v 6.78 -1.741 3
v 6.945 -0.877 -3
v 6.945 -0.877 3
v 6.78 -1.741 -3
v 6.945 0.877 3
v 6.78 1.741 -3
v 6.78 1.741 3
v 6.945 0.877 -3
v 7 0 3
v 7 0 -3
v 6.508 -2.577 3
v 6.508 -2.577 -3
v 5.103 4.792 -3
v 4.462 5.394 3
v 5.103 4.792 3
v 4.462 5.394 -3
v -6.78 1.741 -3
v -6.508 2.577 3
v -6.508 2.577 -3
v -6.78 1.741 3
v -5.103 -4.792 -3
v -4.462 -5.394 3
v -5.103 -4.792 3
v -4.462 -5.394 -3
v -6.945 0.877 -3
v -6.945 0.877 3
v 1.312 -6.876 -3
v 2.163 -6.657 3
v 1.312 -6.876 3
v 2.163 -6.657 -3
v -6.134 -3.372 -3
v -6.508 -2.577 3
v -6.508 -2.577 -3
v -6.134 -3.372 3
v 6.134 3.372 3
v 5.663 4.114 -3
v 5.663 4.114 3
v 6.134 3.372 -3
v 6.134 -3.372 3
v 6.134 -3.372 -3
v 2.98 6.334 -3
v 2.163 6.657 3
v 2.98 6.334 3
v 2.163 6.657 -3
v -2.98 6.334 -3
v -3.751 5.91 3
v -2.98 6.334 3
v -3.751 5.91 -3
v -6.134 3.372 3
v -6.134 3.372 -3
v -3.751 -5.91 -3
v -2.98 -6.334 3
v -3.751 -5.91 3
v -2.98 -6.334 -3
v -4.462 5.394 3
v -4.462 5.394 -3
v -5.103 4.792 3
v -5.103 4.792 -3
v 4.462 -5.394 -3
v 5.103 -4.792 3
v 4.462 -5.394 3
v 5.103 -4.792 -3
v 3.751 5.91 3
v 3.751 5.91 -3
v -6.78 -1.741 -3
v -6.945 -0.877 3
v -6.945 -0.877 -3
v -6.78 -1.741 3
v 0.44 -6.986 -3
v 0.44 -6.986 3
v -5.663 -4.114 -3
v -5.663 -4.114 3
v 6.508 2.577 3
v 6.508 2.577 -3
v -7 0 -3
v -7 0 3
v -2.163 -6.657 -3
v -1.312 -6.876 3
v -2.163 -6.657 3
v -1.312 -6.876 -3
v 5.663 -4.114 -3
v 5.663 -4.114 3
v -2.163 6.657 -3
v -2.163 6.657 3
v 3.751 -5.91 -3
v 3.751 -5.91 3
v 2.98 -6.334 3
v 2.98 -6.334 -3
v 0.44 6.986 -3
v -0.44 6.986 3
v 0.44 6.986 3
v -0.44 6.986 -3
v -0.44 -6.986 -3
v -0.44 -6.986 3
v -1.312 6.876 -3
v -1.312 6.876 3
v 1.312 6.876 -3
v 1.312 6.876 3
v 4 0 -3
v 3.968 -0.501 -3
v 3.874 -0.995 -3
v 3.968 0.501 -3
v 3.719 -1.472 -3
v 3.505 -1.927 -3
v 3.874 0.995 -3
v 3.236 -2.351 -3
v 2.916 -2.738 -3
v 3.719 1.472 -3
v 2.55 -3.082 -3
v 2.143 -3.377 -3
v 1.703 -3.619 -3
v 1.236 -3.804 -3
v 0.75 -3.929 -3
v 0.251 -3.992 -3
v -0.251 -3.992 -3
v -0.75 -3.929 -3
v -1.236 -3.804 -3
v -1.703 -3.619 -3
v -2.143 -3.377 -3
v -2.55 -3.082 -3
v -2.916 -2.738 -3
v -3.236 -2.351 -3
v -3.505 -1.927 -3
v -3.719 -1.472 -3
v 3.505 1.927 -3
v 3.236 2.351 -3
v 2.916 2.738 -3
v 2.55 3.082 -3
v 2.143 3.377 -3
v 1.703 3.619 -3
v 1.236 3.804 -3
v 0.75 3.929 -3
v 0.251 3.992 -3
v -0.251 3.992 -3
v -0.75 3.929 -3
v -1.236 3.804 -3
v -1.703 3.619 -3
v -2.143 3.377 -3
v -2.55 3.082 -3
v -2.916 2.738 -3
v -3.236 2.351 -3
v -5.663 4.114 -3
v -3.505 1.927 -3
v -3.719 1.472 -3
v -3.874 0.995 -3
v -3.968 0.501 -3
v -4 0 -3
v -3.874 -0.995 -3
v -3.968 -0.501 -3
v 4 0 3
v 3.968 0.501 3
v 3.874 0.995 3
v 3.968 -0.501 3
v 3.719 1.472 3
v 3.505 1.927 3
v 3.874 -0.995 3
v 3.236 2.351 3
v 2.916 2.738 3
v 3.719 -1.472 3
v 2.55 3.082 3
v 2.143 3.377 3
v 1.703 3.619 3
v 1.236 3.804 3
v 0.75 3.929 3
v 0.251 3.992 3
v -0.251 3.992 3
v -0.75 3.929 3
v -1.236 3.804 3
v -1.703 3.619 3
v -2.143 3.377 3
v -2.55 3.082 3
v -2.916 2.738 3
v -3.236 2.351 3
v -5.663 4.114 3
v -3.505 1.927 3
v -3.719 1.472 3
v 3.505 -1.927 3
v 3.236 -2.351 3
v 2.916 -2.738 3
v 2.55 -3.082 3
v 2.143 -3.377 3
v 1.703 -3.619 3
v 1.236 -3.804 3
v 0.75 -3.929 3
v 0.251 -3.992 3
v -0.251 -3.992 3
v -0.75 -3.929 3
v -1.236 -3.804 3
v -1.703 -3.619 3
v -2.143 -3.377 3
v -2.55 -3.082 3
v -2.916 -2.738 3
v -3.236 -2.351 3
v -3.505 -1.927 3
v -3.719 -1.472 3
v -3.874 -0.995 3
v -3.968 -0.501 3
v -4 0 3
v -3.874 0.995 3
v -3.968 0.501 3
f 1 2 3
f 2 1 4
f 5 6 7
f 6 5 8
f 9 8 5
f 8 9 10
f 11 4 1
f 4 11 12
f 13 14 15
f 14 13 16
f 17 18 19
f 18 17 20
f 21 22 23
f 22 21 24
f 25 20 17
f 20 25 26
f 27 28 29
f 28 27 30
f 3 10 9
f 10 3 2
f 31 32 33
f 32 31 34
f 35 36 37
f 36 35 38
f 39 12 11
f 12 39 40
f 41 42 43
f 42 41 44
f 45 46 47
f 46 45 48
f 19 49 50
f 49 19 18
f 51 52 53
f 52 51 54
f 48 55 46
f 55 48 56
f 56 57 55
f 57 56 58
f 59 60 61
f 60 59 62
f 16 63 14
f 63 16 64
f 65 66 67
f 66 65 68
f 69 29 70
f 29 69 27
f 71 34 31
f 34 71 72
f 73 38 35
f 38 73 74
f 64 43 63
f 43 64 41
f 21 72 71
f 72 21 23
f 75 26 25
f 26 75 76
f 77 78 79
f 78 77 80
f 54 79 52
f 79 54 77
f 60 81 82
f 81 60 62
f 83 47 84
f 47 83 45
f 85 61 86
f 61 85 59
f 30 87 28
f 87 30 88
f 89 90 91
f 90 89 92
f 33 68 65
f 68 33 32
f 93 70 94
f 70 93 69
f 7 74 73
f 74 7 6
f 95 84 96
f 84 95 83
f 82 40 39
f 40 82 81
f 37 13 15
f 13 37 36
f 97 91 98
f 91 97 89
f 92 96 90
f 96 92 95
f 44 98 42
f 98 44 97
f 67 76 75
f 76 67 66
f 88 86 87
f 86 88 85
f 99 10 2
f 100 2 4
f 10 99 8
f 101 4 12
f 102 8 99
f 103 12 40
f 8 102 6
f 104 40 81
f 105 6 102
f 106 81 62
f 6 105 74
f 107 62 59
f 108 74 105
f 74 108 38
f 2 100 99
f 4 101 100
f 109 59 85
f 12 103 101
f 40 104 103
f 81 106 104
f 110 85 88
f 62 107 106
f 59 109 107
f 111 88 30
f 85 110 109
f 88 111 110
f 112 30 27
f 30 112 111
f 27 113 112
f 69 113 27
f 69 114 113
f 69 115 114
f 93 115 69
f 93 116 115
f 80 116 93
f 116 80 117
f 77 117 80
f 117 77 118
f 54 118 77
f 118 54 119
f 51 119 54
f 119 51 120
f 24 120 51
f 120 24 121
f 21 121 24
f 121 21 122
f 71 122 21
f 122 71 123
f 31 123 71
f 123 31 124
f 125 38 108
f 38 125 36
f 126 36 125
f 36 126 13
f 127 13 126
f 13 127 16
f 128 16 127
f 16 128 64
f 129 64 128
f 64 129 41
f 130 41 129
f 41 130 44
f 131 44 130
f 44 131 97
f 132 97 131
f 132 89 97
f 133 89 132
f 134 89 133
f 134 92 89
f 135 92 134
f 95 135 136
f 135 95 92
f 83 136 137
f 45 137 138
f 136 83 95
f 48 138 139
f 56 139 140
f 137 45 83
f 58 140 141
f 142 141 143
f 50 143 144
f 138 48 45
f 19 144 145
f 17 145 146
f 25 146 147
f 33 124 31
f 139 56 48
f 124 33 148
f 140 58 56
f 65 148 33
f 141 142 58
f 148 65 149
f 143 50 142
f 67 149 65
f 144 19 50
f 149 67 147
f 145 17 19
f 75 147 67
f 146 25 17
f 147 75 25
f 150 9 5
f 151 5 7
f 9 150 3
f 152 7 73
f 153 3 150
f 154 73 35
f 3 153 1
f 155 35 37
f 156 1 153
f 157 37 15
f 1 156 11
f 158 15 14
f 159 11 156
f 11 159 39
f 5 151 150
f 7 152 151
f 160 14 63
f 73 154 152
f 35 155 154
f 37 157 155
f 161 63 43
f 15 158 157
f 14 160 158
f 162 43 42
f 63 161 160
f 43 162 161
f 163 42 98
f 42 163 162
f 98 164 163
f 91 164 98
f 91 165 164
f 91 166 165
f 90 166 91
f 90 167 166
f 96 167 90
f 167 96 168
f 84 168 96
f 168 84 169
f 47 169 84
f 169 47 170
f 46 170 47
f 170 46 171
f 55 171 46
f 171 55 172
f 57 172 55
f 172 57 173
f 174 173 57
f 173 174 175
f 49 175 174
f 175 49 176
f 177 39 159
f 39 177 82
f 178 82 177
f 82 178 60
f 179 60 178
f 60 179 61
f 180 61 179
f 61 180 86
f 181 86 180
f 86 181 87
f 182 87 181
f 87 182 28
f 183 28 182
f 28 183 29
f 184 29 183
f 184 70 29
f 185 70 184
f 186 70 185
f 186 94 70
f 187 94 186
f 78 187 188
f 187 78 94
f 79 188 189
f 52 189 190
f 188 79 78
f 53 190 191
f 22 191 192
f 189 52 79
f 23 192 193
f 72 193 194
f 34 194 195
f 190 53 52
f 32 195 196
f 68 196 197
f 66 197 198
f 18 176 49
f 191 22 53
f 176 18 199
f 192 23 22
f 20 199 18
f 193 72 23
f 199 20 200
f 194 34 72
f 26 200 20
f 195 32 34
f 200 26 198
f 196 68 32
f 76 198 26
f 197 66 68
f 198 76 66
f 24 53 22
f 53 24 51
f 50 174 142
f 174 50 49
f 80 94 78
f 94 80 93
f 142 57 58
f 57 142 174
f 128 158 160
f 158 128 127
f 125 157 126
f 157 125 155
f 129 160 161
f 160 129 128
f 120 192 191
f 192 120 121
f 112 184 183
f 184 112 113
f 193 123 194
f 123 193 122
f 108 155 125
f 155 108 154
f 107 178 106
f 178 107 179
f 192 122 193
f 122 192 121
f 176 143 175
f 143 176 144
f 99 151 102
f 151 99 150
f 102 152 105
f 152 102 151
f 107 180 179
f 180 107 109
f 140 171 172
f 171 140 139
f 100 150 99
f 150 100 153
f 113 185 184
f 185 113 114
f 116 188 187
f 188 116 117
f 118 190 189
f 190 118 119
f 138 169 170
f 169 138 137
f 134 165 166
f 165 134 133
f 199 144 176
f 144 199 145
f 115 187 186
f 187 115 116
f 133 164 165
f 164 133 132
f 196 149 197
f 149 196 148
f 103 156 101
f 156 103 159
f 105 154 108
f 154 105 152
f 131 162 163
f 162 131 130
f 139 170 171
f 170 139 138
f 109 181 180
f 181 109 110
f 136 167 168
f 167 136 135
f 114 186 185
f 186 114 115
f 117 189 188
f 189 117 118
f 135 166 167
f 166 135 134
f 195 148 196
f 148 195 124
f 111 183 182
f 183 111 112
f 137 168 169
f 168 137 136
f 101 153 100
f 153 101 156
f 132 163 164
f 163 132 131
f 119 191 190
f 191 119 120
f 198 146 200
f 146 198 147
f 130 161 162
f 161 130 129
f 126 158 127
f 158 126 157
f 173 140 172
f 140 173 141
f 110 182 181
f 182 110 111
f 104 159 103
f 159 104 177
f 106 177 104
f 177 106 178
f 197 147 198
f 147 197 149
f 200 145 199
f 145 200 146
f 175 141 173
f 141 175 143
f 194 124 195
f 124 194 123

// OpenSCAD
$fn = 50;


difference() {
	union() {
		translate(v = [0, 0, -3.0000000000]) {
			cylinder(h = 6, r = 7.0000000000);
		}
	}
	union() {
		translate(v = [0, 0, -100.0000000000]) {
			cylinder(h = 200, r = 4.0000000000);
		}
	}
}
